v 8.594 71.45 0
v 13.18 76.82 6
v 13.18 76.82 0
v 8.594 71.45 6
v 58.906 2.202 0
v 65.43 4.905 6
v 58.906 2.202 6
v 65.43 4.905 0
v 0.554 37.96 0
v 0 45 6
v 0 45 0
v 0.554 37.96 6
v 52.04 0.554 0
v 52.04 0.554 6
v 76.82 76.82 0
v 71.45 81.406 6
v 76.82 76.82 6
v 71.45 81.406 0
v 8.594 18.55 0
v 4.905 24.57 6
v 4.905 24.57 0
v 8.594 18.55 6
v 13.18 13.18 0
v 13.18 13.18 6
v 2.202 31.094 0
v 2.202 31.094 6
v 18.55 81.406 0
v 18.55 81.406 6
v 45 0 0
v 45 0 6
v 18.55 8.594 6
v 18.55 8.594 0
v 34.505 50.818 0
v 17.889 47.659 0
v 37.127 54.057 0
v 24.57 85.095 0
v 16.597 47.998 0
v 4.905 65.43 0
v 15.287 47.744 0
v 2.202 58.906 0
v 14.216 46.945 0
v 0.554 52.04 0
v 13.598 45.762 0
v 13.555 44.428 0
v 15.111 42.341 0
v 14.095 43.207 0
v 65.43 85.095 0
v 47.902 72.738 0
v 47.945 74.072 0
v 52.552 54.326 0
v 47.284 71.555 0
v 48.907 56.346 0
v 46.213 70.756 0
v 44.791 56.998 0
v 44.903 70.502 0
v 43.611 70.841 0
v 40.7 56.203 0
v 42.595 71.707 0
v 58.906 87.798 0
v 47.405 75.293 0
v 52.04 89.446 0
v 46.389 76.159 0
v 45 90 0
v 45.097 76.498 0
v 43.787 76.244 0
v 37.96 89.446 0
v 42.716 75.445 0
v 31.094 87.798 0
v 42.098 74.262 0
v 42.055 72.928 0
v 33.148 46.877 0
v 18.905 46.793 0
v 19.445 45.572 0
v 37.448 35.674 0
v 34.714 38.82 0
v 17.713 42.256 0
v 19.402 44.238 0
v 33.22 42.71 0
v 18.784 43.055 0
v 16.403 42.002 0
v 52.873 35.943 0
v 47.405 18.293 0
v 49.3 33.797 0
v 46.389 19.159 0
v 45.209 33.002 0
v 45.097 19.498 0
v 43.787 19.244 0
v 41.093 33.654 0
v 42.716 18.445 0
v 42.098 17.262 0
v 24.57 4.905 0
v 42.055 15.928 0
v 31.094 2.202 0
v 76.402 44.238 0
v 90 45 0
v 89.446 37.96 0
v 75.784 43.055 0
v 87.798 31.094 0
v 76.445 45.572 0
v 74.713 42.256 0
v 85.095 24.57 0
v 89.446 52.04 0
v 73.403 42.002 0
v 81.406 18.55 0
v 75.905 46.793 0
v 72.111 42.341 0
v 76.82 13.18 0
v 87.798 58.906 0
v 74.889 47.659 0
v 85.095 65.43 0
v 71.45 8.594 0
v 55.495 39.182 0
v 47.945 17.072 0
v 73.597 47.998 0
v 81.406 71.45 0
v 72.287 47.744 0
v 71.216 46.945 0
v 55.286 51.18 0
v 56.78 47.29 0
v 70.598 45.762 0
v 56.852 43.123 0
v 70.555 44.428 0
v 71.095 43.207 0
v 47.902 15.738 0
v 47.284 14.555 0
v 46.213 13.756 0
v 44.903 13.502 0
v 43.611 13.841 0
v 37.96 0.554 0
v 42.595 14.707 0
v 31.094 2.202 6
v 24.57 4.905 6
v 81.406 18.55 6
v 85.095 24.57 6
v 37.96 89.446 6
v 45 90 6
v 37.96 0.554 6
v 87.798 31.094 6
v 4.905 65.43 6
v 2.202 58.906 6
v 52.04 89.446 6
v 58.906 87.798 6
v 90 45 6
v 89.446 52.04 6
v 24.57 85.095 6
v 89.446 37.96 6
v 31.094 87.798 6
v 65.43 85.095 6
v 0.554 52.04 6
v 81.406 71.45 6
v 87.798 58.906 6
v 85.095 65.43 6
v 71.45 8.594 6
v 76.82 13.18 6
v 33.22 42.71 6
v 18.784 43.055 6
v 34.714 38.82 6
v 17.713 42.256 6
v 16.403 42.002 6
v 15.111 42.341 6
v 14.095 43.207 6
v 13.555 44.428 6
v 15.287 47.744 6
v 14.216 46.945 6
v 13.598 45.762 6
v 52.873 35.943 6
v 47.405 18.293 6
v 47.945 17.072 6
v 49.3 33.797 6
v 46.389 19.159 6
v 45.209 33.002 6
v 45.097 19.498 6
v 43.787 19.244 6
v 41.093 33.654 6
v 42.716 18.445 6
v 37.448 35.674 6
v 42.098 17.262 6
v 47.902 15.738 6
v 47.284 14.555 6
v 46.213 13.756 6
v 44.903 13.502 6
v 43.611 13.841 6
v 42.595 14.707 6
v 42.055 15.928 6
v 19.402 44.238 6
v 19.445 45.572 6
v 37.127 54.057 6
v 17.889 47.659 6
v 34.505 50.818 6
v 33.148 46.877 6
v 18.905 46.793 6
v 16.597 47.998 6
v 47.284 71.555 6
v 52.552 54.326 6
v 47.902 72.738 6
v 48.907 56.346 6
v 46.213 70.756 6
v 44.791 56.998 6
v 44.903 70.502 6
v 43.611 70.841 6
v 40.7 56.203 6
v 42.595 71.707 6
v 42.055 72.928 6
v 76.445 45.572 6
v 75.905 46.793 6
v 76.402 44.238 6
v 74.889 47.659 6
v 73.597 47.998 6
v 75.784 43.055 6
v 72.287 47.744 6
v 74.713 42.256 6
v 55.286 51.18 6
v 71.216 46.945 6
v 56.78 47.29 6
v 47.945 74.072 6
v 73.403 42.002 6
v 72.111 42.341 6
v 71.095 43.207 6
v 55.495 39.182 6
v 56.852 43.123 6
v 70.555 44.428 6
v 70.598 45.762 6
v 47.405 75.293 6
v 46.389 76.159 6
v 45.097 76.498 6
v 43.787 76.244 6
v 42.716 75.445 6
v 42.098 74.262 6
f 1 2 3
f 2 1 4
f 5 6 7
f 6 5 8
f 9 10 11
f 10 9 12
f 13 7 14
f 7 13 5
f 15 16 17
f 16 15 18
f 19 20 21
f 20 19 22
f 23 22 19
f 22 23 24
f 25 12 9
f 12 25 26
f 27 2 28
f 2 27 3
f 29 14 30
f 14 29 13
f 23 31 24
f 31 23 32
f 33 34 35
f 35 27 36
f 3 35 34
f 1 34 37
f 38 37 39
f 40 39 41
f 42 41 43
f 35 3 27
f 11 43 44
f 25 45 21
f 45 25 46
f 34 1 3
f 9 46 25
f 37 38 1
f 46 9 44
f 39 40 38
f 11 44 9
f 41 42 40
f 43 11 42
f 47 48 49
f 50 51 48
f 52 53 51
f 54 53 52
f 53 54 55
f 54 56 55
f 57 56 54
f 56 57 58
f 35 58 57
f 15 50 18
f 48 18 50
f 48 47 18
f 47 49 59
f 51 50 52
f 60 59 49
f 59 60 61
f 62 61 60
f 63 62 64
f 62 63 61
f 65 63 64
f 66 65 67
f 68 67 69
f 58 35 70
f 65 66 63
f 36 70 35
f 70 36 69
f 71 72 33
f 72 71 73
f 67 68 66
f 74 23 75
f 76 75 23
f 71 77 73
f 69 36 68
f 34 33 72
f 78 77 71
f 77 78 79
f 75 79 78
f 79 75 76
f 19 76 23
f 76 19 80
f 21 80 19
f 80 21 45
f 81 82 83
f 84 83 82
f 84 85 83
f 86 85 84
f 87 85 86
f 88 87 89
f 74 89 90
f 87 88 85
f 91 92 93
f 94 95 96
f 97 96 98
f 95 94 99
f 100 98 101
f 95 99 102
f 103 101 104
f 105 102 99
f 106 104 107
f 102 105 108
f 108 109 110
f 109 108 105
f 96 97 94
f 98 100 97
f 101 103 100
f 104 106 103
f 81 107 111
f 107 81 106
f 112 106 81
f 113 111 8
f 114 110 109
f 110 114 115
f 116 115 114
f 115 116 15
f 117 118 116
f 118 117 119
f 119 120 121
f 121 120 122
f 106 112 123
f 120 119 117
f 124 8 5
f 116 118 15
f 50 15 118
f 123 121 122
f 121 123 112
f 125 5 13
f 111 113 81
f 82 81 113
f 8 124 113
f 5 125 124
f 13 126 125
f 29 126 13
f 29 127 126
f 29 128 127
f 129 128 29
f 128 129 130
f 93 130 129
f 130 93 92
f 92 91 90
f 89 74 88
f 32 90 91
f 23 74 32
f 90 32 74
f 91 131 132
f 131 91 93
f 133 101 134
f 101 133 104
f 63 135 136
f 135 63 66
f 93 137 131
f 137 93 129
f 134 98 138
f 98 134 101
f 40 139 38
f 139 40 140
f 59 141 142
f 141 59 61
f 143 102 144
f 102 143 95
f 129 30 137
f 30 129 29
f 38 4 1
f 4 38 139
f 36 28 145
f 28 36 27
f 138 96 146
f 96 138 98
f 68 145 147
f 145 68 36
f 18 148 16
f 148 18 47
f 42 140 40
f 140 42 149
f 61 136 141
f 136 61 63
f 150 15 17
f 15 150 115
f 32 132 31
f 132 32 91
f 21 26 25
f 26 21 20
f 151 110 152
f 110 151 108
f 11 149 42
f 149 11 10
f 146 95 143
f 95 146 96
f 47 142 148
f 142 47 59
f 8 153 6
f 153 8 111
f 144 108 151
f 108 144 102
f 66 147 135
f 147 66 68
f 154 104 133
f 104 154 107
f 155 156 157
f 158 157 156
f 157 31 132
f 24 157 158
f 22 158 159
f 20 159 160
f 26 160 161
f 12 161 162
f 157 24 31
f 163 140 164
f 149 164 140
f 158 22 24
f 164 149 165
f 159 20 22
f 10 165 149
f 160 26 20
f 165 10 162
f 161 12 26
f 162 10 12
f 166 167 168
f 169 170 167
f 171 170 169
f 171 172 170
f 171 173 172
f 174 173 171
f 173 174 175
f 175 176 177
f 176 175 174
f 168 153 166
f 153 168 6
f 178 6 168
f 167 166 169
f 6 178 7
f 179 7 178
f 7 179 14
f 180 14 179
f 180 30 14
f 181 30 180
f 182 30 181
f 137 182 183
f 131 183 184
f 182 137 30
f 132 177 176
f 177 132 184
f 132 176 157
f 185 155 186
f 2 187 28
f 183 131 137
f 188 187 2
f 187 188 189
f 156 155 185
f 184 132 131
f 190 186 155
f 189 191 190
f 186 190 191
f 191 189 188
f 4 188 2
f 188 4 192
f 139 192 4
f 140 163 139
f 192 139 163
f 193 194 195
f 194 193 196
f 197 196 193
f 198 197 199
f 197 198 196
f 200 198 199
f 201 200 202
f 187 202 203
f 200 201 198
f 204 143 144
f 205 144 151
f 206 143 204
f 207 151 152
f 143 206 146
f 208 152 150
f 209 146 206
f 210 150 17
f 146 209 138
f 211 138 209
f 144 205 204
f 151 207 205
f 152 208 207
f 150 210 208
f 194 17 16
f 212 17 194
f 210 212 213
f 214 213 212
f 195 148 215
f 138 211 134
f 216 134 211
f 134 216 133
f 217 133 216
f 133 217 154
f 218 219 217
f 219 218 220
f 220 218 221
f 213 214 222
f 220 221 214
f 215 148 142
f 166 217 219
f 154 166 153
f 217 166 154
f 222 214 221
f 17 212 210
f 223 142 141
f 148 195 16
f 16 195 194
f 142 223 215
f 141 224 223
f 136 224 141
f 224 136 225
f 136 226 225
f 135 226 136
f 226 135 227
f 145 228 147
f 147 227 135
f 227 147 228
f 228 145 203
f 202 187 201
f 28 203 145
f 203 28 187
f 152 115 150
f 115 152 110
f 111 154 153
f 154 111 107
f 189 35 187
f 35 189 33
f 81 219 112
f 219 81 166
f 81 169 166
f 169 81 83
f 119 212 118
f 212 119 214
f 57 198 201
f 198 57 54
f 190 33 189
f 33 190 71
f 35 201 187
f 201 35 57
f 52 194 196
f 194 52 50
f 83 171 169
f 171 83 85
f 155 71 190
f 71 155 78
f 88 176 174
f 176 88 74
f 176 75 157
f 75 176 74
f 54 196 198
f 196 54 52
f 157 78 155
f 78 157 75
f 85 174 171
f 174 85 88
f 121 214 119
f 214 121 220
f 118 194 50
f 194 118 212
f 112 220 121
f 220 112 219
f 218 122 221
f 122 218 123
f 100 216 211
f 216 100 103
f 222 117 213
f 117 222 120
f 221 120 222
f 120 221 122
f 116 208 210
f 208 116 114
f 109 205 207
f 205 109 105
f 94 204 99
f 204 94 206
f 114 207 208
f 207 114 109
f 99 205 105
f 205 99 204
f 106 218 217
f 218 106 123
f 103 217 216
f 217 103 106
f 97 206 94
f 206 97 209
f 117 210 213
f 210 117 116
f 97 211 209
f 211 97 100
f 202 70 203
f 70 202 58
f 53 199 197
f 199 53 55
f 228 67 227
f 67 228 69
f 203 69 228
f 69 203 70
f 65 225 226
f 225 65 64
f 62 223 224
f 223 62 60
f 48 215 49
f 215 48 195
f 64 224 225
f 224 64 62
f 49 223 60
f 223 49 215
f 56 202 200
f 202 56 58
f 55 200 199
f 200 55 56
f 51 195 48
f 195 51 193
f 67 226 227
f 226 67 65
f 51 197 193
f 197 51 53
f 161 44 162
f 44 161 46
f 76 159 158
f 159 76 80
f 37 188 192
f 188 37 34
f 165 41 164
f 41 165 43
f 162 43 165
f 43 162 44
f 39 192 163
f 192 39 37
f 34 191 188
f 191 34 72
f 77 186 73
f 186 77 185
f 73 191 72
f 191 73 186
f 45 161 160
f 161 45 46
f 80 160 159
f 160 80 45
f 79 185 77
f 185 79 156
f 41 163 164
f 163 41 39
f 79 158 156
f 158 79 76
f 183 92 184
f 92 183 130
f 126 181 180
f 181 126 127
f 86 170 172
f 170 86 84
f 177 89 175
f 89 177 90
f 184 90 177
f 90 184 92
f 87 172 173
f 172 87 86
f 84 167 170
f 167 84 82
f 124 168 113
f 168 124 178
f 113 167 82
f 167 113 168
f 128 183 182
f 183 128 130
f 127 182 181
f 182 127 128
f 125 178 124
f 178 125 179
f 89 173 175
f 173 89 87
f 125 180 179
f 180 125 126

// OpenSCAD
$fn = 32;

// ----------------------------------------------------------------------
// Spacer plate: round flange R45, 4 bolts
// ----------------------------------------------------------------------

// --- parameters (mm) ---
bore_r = 12;              // centre bore radius
bolt_r = 3;               // bolt hole radius
plate_t = 6;              // plate thickness, Z (extrusion height)
flange_r = 45;            // flange radius
n_bolt = 4;               // bolt hole count
ring_r = 28.5;            // bolt circle radius

profile = [[90, 45], [89.446, 52.04], [87.798, 58.906], [85.095, 65.43], [81.406, 71.45], [76.82, 76.82], [71.45, 81.406], [65.43, 85.095], [58.906, 87.798], [52.04, 89.446], [45, 90], [37.96, 89.446], [31.094, 87.798], [24.57, 85.095], [18.55, 81.406], [13.18, 76.82], [8.594, 71.45], [4.905, 65.43], [2.202, 58.906], [0.554, 52.04], [0, 45], [0.554, 37.96], [2.202, 31.094], [4.905, 24.57], [8.594, 18.55], [13.18, 13.18], [18.55, 8.594], [24.57, 4.905], [31.094, 2.202], [37.96, 0.554], [45, 0], [52.04, 0.554], [58.906, 2.202], [65.43, 4.905], [71.45, 8.594], [76.82, 13.18], [81.406, 18.55], [85.095, 24.57], [87.798, 31.094], [89.446, 37.96]];  // primary outline, 40 points, counter clockwise
void_1 = [[56.78, 47.29], [55.286, 51.18], [52.552, 54.326], [48.907, 56.346], [44.791, 56.998], [40.7, 56.203], [37.127, 54.057], [34.505, 50.818], [33.148, 46.877], [33.22, 42.71], [34.714, 38.82], [37.448, 35.674], [41.093, 33.654], [45.209, 33.002], [49.3, 33.797], [52.873, 35.943], [55.495, 39.182], [56.852, 43.123]];  // centre bore, 18 points
void_2 = [[76.445, 45.572], [75.905, 46.793], [74.889, 47.659], [73.597, 47.998], [72.287, 47.744], [71.216, 46.945], [70.598, 45.762], [70.555, 44.428], [71.095, 43.207], [72.111, 42.341], [73.403, 42.002], [74.713, 42.256], [75.784, 43.055], [76.402, 44.238]];  // bolt hole 1, 14 points
void_3 = [[47.945, 74.072], [47.405, 75.293], [46.389, 76.159], [45.097, 76.498], [43.787, 76.244], [42.716, 75.445], [42.098, 74.262], [42.055, 72.928], [42.595, 71.707], [43.611, 70.841], [44.903, 70.502], [46.213, 70.756], [47.284, 71.555], [47.902, 72.738]];  // bolt hole 2, 14 points
void_4 = [[19.445, 45.572], [18.905, 46.793], [17.889, 47.659], [16.597, 47.998], [15.287, 47.744], [14.216, 46.945], [13.598, 45.762], [13.555, 44.428], [14.095, 43.207], [15.111, 42.341], [16.403, 42.002], [17.713, 42.256], [18.784, 43.055], [19.402, 44.238]];  // bolt hole 3, 14 points
void_5 = [[47.945, 17.072], [47.405, 18.293], [46.389, 19.159], [45.097, 19.498], [43.787, 19.244], [42.716, 18.445], [42.098, 17.262], [42.055, 15.928], [42.595, 14.707], [43.611, 13.841], [44.903, 13.502], [46.213, 13.756], [47.284, 14.555], [47.902, 15.738]];  // bolt hole 4, 14 points

// --- the one profile operation ---
difference() {
  linear_extrude(height = plate_t) polygon(points = profile);
  translate([0, 0, -1])
    linear_extrude(height = plate_t + 2) polygon(points = void_1);
  translate([0, 0, -1])
    linear_extrude(height = plate_t + 2) polygon(points = void_2);
  translate([0, 0, -1])
    linear_extrude(height = plate_t + 2) polygon(points = void_3);
  translate([0, 0, -1])
    linear_extrude(height = plate_t + 2) polygon(points = void_4);
  translate([0, 0, -1])
    linear_extrude(height = plate_t + 2) polygon(points = void_5);
}
